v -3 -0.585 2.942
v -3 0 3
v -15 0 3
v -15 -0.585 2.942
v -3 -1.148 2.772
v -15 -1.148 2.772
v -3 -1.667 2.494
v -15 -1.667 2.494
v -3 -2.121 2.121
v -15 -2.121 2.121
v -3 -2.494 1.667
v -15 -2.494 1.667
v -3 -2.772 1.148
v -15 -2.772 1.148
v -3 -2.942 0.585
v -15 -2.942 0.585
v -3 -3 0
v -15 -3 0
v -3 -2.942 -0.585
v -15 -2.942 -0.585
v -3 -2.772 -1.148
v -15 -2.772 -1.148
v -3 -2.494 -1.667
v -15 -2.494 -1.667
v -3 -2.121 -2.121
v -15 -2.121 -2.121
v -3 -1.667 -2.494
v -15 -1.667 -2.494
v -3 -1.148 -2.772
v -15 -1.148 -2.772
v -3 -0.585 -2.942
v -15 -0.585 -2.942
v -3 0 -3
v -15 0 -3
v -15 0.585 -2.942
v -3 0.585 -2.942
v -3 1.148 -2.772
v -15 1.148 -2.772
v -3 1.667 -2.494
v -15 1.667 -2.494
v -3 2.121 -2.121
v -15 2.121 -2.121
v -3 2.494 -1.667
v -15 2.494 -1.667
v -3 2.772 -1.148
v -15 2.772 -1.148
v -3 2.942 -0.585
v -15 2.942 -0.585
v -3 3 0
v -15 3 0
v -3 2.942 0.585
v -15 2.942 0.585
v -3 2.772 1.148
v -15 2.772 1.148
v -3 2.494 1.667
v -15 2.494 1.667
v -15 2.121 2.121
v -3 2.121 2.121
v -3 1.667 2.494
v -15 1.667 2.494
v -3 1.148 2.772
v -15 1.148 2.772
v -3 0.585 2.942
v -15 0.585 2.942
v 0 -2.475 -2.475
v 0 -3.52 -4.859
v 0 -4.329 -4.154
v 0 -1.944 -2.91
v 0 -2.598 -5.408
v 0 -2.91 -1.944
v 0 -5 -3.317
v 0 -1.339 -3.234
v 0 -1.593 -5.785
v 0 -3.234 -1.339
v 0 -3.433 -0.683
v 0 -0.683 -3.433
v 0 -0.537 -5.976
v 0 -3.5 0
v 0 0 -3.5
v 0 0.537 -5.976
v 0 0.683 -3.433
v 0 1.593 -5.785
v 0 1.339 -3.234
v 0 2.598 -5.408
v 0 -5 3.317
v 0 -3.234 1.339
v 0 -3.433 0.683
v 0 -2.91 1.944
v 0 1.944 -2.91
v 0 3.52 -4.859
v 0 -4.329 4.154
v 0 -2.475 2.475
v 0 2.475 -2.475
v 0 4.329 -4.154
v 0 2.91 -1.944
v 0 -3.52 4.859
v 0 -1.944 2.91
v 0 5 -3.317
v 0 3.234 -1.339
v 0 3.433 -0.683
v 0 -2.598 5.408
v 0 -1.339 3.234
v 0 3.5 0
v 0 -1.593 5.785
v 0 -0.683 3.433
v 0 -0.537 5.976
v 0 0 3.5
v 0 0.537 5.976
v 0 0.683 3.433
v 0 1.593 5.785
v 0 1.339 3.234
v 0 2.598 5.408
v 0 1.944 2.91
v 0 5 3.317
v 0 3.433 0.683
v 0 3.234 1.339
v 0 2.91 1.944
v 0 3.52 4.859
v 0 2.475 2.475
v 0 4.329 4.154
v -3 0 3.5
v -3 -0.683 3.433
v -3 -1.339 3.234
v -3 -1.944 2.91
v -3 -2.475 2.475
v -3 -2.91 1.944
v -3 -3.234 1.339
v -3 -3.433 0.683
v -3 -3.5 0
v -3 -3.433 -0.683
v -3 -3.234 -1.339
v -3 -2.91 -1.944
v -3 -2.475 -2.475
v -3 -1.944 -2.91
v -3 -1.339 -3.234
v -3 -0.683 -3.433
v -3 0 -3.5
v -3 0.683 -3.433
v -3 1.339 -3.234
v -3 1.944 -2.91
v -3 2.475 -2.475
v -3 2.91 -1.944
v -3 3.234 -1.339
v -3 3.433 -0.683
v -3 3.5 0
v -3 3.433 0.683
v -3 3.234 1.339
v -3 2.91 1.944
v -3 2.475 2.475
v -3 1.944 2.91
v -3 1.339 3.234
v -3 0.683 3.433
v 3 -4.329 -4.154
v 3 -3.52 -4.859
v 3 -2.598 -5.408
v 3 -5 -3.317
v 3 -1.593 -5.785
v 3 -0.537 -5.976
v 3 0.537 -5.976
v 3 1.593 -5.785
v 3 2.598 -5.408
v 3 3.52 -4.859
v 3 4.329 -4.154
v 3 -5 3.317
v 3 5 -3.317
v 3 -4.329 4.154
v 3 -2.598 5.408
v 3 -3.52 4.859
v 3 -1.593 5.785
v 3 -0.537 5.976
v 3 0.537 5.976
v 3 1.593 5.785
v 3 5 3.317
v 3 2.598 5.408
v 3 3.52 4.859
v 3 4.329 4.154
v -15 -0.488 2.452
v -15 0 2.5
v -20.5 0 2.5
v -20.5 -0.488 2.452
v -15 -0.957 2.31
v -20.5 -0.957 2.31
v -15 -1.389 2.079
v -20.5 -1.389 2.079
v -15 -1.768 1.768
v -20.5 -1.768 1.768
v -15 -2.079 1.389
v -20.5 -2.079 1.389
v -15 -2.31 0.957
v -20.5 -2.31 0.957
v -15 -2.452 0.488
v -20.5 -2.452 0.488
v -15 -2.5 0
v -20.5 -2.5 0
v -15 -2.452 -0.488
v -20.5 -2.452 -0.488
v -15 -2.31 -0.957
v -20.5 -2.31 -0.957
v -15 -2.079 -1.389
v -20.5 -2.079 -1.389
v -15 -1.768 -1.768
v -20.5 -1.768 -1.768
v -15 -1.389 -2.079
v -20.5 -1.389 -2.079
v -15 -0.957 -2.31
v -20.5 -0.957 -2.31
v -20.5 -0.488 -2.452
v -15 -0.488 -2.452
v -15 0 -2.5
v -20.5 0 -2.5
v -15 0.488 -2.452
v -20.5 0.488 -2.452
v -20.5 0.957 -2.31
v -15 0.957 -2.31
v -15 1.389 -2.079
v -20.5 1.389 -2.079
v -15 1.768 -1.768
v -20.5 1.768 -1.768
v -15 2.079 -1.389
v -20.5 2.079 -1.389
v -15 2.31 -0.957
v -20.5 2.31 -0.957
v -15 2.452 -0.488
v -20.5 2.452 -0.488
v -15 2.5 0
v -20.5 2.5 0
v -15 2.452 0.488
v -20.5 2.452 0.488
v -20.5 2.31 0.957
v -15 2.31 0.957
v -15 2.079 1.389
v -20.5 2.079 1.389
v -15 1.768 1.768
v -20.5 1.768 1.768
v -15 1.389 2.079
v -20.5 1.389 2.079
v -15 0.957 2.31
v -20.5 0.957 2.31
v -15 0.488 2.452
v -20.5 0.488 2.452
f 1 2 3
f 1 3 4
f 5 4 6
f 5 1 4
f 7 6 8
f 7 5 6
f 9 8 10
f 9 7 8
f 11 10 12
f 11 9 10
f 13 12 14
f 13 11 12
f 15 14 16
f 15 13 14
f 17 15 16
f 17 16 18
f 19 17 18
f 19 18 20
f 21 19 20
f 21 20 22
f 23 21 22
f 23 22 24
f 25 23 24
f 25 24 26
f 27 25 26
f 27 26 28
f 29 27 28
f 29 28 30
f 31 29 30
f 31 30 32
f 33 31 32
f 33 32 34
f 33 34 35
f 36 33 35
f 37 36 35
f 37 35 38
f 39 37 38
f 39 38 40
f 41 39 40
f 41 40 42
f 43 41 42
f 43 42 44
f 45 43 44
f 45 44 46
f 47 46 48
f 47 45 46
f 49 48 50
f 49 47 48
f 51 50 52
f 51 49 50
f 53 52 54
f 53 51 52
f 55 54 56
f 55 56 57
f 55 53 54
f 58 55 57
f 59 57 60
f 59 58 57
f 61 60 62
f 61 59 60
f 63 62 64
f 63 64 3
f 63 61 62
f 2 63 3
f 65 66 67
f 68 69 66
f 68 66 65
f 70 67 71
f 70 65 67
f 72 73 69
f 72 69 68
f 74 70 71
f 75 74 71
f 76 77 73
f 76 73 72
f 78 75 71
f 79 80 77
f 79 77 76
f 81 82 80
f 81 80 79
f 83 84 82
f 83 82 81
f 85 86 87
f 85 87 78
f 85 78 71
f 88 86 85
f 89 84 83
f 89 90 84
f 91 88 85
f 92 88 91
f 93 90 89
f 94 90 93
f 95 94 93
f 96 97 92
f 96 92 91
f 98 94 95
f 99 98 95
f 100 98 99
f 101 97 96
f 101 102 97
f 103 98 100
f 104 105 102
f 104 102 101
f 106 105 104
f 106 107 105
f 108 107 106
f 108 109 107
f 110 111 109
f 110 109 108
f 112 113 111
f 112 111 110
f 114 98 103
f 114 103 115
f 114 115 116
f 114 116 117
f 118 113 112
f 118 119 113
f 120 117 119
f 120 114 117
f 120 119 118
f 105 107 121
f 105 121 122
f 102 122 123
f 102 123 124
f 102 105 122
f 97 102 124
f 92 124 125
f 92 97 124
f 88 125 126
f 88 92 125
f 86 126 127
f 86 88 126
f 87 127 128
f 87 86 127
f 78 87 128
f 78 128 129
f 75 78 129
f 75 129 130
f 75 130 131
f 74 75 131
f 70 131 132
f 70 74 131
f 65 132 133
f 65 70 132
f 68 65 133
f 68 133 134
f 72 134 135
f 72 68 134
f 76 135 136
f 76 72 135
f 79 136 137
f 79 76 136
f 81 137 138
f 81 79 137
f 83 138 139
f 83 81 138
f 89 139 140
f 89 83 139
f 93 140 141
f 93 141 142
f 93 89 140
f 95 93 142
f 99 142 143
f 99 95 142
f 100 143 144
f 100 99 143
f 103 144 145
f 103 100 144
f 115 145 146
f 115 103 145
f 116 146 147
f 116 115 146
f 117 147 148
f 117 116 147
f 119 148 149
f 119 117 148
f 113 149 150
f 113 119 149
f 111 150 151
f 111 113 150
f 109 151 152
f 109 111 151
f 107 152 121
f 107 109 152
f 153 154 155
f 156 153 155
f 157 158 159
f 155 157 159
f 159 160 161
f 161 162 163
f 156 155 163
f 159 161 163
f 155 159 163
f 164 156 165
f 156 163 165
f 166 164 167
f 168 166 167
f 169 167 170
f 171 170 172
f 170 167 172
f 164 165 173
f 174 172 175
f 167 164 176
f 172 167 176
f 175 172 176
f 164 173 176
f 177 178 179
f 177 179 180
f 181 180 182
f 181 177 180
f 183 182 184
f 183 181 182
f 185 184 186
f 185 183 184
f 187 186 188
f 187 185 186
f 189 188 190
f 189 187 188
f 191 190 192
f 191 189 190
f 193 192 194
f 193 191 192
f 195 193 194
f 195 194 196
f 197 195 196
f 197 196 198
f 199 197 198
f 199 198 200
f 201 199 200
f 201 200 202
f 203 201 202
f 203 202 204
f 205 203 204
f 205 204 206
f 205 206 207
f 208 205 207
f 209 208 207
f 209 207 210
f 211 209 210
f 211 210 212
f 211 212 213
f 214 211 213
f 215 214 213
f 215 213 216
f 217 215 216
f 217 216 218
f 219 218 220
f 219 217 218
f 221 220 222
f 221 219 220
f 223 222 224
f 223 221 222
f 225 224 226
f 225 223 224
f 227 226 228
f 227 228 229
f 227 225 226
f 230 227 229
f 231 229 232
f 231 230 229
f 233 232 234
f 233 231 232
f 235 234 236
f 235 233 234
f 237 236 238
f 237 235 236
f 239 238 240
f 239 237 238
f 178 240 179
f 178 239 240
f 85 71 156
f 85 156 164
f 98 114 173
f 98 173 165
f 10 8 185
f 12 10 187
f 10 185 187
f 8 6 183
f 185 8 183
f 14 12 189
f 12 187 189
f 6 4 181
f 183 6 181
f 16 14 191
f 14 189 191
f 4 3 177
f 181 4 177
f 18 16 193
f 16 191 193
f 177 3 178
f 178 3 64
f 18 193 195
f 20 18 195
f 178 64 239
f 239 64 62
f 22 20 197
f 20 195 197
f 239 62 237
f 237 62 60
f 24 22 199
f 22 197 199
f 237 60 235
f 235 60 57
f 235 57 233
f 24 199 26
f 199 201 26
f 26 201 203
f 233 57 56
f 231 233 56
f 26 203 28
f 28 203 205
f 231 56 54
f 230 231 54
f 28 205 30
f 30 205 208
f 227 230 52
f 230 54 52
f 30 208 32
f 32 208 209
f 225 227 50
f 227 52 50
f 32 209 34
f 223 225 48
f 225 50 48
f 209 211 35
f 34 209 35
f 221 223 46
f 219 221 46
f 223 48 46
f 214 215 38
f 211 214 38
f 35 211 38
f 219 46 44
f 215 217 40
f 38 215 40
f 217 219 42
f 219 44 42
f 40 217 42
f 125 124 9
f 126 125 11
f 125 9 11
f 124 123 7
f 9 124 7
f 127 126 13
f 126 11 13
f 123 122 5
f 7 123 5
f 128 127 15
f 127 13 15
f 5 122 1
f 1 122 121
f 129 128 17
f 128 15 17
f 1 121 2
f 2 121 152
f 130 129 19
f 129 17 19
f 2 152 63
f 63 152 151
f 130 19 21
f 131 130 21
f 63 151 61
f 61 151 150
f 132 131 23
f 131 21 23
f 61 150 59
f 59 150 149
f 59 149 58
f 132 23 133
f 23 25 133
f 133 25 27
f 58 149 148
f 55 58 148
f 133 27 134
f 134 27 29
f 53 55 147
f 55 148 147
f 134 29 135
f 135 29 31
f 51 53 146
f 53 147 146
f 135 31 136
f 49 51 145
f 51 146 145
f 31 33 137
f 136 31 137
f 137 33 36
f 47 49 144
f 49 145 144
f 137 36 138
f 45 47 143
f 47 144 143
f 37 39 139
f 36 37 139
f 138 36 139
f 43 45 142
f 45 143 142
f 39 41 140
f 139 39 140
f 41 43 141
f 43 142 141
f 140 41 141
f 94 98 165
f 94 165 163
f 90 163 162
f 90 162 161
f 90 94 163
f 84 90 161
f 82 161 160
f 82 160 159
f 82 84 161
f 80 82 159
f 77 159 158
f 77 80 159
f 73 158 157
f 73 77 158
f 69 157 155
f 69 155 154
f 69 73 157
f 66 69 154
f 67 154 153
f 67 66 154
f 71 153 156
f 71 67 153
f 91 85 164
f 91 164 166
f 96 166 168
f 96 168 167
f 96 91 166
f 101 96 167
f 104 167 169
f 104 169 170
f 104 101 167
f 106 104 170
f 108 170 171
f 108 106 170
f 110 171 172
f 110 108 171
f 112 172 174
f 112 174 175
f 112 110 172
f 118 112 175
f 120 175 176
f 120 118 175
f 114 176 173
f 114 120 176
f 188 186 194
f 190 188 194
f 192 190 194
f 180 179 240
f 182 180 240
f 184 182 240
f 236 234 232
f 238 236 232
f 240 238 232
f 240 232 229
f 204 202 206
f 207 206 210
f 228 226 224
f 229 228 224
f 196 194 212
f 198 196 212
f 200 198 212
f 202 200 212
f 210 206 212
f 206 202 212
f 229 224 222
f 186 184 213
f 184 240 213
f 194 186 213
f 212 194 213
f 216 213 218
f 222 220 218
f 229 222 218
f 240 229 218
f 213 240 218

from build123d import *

# Parameters (mm, degrees)
BOSS_EXTRUDE1_DEPTH = 3
BOSS_EXTRUDE2_DEPTH = 15
BOSS_EXTRUDE3_DEPTH = 20.5
BOSS_EXTRUDE4_DEPTH = 3


with BuildPart() as part:
    # Sketch2 → Boss-Extrude1 (new body)
    with BuildSketch(Plane(origin=(0, 0, 0), x_dir=(0, 0, -1), z_dir=(1, 0, 0))):
        with BuildLine():
            Line((3.31662479, 5), (-3.31662479, 5))
            ThreePointArc((-3.31662479, 5), (-5.286764074, 2.837274331), (-6, 0))
            ThreePointArc((-6, 0), (-5.286764074, -2.837274331), (-3.31662479, -5))
            Line((-3.31662479, -5), (3.31662479, -5))
            ThreePointArc((3.31662479, -5), (6, 0), (3.31662479, 5))
        make_face()
    extrude(amount=BOSS_EXTRUDE1_DEPTH)

    # Sketch2<4> → Boss-Extrude2 (add)
    with BuildSketch(Plane(origin=(0, 0, 0), x_dir=(0, 0, -1), z_dir=(1, 0, 0))):
        with BuildLine():
            ThreePointArc((3, 0), (0, 3), (-3, 0))
            ThreePointArc((-3, 0), (0, -3), (3, 0))
        make_face()
        with BuildLine():
            ThreePointArc((2.5, 0), (0, -2.5), (-2.5, 0))
            ThreePointArc((-2.5, 0), (0, 2.5), (2.5, 0))
        make_face(mode=Mode.SUBTRACT)
    extrude(amount=-BOSS_EXTRUDE2_DEPTH)

    # Sketch2<5> → Boss-Extrude3 (add)
    with BuildSketch(Plane(origin=(0, 0, 0), x_dir=(0, 0, -1), z_dir=(1, 0, 0))):
        with BuildLine():
            ThreePointArc((2.5, 0), (0, 2.5), (-2.5, 0))
            ThreePointArc((-2.5, 0), (0, -2.5), (2.5, 0))
        make_face()
    extrude(amount=-BOSS_EXTRUDE3_DEPTH)

    # Sketch2<6> → Boss-Extrude4 (add)
    with BuildSketch(Plane(origin=(0, 0, 0), x_dir=(0, 0, -1), z_dir=(1, 0, 0))):
        with BuildLine():
            ThreePointArc((3.5, 0), (0, 3.5), (-3.5, 0))
            ThreePointArc((-3.5, 0), (0, -3.5), (3.5, 0))
        make_face()
        with BuildLine():
            ThreePointArc((3, 0), (0, -3), (-3, 0))
            ThreePointArc((-3, 0), (0, 3), (3, 0))
        make_face(mode=Mode.SUBTRACT)
    extrude(amount=-BOSS_EXTRUDE4_DEPTH)


solid = part.part
